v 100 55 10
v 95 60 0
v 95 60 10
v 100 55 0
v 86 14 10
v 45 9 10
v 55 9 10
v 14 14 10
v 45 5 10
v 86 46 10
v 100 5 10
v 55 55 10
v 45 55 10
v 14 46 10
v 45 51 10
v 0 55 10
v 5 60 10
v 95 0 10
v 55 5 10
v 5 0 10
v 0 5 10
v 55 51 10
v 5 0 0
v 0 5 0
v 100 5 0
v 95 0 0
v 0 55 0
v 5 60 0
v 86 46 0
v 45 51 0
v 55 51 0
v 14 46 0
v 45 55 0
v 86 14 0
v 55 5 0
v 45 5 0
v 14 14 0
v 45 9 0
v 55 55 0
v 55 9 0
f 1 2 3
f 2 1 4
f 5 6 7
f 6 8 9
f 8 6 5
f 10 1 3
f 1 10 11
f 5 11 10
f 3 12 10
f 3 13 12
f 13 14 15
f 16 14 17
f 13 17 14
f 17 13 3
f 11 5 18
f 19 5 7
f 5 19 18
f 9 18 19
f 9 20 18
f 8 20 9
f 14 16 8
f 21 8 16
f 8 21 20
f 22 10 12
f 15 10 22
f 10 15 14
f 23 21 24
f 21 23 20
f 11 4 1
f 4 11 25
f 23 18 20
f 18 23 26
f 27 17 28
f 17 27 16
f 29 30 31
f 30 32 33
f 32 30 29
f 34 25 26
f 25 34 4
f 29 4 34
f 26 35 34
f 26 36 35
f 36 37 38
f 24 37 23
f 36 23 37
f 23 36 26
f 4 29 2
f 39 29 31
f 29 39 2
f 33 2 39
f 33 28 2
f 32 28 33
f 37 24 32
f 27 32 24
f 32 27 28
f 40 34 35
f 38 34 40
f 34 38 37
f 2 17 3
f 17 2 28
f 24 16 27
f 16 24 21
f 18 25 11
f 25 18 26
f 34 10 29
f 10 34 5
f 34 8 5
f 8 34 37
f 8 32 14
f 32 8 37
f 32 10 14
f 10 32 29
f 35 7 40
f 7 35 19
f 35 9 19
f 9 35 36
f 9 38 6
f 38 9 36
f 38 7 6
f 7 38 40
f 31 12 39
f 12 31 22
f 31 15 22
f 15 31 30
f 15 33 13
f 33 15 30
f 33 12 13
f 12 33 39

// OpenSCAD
$fn = 32;

// ----------------------------------------------------------------------
// Frame plate: 100 x 60 frame, 14 mm rails
// ----------------------------------------------------------------------

// --- parameters (mm) ---
plate_l = 100;            // plate length, X
plate_w = 60;             // plate width, Y
plate_t = 10;             // plate thickness, Z (extrusion height)
corner_c = 5;             // corner chamfer
frame_bar = 14;           // frame rail width
slot_l = 10;              // adjustment slot length
slot_w = 4;               // adjustment slot width

win_l = plate_l - 2 * frame_bar;  // window length
win_w = plate_w - 2 * frame_bar;  // window width

profile = [[5, 0], [95, 0], [100, 5], [100, 55], [95, 60], [5, 60], [0, 55], [0, 5]];  // primary outline, 8 points, counter clockwise
void_1 = [[14, 14], [86, 14], [86, 46], [14, 46]];  // the window, 4 points
void_2 = [[45, 5], [55, 5], [55, 9], [45, 9]];  // adjustment slot, 4 points
void_3 = [[45, 51], [55, 51], [55, 55], [45, 55]];  // adjustment slot, 4 points

// --- the one profile operation ---
difference() {
  linear_extrude(height = plate_t) polygon(points = profile);
  translate([0, 0, -1])
    linear_extrude(height = plate_t + 2) polygon(points = void_1);
  translate([0, 0, -1])
    linear_extrude(height = plate_t + 2) polygon(points = void_2);
  translate([0, 0, -1])
    linear_extrude(height = plate_t + 2) polygon(points = void_3);
}
